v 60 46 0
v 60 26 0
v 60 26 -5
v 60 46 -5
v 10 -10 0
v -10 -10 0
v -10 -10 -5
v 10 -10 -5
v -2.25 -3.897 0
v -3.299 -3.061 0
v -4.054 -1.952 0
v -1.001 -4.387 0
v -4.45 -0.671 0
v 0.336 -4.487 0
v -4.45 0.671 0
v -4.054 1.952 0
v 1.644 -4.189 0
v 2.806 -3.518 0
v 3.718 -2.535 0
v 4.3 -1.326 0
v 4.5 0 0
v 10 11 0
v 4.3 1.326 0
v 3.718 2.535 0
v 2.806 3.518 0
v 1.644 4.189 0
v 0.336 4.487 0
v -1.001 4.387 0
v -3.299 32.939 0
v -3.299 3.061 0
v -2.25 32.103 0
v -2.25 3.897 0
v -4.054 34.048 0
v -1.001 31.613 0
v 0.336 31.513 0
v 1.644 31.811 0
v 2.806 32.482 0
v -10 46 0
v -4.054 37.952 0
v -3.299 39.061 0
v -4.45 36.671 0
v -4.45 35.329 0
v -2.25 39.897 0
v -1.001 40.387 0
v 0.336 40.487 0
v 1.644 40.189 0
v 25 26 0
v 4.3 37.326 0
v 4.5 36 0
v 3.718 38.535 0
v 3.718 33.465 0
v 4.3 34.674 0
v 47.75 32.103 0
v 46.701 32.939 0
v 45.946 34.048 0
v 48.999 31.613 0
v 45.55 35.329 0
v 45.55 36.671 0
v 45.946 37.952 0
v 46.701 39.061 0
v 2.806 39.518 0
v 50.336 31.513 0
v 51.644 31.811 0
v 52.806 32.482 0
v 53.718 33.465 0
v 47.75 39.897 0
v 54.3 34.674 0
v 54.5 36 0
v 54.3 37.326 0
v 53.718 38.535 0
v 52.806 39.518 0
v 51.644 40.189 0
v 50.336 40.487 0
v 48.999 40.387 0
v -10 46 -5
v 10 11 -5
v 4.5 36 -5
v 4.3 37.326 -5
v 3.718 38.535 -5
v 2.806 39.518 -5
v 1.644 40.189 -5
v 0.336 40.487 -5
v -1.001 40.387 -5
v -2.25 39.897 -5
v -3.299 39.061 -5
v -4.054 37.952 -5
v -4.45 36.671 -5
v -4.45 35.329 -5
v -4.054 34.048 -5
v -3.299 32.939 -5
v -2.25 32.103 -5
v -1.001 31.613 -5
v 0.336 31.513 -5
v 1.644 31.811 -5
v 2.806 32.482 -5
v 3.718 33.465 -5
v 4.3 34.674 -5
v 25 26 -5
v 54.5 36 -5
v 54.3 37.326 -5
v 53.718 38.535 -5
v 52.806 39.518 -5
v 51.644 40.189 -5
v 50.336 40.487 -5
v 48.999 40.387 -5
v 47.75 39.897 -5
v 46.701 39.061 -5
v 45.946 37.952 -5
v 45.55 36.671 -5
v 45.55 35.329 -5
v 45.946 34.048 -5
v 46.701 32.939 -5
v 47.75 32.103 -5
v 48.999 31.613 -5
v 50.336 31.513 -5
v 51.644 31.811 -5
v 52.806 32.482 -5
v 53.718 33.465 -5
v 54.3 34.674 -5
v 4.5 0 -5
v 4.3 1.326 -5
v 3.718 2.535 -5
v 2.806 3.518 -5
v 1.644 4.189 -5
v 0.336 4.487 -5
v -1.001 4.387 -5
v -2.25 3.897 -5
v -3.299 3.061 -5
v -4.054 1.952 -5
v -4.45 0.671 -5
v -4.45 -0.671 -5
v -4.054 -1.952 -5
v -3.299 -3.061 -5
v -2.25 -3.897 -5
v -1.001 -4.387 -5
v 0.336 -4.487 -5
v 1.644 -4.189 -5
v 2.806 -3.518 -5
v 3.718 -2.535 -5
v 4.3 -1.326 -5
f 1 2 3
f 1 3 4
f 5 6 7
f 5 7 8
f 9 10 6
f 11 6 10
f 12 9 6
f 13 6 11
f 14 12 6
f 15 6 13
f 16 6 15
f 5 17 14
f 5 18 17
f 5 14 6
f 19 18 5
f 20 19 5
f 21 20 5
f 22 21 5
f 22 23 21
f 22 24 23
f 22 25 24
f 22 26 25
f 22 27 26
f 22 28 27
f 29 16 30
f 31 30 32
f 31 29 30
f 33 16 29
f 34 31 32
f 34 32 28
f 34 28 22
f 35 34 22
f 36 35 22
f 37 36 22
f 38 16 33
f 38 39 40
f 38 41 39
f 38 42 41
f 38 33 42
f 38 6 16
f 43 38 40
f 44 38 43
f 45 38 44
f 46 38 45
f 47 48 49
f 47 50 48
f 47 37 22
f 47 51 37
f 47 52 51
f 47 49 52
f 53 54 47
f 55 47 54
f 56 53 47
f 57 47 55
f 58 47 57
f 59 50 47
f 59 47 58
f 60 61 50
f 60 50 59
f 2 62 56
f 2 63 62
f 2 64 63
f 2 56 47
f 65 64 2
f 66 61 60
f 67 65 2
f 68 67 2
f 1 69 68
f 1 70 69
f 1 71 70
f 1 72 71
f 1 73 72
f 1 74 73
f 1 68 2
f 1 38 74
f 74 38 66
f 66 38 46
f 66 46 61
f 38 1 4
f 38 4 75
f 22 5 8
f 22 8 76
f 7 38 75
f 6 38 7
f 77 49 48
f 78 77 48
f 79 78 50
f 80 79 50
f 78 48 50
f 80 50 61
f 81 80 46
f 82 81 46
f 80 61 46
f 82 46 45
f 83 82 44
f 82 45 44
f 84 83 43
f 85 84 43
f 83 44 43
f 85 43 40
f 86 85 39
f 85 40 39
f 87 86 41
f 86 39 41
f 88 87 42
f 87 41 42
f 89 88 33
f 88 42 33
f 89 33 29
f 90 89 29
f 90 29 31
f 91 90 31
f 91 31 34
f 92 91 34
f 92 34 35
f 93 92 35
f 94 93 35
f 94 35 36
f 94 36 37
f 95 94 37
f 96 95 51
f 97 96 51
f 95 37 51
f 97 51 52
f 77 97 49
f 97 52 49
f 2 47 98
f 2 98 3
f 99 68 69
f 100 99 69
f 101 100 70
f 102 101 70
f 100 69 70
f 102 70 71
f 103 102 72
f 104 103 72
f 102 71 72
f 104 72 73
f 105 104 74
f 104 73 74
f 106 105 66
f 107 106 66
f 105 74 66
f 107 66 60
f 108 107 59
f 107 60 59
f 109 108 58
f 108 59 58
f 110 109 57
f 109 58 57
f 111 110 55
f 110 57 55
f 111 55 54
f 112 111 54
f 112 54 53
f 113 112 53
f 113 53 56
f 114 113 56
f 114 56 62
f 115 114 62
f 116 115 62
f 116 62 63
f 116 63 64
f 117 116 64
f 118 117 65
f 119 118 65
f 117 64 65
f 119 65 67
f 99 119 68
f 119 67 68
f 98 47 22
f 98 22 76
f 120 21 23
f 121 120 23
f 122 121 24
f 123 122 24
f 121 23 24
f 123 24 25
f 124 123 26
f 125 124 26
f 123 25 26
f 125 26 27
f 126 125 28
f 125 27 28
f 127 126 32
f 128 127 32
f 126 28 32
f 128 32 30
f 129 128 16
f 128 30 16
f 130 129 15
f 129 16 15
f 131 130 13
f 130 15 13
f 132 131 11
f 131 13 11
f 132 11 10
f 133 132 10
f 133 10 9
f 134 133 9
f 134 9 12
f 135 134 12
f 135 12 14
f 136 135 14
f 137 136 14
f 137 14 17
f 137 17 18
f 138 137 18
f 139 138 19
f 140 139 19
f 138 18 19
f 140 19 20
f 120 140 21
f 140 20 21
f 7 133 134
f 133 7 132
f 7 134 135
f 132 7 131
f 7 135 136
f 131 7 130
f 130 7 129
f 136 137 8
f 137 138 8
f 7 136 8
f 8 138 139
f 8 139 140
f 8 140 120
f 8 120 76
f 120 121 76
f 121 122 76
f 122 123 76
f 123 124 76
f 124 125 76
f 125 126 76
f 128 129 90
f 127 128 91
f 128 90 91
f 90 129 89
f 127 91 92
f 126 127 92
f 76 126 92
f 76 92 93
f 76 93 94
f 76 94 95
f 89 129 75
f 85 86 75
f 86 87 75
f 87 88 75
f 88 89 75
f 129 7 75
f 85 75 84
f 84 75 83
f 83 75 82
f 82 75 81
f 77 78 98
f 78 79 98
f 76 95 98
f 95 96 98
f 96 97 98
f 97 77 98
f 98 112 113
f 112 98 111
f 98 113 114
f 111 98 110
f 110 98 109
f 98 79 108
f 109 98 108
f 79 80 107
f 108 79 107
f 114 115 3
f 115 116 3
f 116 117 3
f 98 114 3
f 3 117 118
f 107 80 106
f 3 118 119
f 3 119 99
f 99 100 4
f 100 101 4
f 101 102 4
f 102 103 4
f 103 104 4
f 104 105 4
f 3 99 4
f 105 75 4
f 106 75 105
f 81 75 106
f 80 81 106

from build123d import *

# Parameters (mm, degrees)
SKETCH_1_R      = 4.5
EXTRUDE_1_DEPTH = 5
CHAMFER_1_SIZE  = 15


with BuildPart() as part:
    # 草图1 → 凸台-拉伸1 (new body)
    with BuildSketch(Plane.XY):
        Polygon((-10, 26), (-10, 10), (-10, -10), (10, -10), (10, 10), (10, 26), (40, 26), (60, 26), (60, 46), (40, 46), (10, 46), (-10, 46), align=None)
        Circle(SKETCH_1_R, mode=Mode.SUBTRACT)
        with Locations((0, 36)):
            Circle(SKETCH_1_R, mode=Mode.SUBTRACT)
        with Locations((50, 36)):
            Circle(SKETCH_1_R, mode=Mode.SUBTRACT)
    extrude(amount=-EXTRUDE_1_DEPTH)

    # 倒角1
    chamfer_1_edges = [part.edges().sort_by_distance(p)[0] for p in [
        (10, 26, -2.5),
    ]]
    chamfer(chamfer_1_edges, length=CHAMFER_1_SIZE)


solid = part.part
